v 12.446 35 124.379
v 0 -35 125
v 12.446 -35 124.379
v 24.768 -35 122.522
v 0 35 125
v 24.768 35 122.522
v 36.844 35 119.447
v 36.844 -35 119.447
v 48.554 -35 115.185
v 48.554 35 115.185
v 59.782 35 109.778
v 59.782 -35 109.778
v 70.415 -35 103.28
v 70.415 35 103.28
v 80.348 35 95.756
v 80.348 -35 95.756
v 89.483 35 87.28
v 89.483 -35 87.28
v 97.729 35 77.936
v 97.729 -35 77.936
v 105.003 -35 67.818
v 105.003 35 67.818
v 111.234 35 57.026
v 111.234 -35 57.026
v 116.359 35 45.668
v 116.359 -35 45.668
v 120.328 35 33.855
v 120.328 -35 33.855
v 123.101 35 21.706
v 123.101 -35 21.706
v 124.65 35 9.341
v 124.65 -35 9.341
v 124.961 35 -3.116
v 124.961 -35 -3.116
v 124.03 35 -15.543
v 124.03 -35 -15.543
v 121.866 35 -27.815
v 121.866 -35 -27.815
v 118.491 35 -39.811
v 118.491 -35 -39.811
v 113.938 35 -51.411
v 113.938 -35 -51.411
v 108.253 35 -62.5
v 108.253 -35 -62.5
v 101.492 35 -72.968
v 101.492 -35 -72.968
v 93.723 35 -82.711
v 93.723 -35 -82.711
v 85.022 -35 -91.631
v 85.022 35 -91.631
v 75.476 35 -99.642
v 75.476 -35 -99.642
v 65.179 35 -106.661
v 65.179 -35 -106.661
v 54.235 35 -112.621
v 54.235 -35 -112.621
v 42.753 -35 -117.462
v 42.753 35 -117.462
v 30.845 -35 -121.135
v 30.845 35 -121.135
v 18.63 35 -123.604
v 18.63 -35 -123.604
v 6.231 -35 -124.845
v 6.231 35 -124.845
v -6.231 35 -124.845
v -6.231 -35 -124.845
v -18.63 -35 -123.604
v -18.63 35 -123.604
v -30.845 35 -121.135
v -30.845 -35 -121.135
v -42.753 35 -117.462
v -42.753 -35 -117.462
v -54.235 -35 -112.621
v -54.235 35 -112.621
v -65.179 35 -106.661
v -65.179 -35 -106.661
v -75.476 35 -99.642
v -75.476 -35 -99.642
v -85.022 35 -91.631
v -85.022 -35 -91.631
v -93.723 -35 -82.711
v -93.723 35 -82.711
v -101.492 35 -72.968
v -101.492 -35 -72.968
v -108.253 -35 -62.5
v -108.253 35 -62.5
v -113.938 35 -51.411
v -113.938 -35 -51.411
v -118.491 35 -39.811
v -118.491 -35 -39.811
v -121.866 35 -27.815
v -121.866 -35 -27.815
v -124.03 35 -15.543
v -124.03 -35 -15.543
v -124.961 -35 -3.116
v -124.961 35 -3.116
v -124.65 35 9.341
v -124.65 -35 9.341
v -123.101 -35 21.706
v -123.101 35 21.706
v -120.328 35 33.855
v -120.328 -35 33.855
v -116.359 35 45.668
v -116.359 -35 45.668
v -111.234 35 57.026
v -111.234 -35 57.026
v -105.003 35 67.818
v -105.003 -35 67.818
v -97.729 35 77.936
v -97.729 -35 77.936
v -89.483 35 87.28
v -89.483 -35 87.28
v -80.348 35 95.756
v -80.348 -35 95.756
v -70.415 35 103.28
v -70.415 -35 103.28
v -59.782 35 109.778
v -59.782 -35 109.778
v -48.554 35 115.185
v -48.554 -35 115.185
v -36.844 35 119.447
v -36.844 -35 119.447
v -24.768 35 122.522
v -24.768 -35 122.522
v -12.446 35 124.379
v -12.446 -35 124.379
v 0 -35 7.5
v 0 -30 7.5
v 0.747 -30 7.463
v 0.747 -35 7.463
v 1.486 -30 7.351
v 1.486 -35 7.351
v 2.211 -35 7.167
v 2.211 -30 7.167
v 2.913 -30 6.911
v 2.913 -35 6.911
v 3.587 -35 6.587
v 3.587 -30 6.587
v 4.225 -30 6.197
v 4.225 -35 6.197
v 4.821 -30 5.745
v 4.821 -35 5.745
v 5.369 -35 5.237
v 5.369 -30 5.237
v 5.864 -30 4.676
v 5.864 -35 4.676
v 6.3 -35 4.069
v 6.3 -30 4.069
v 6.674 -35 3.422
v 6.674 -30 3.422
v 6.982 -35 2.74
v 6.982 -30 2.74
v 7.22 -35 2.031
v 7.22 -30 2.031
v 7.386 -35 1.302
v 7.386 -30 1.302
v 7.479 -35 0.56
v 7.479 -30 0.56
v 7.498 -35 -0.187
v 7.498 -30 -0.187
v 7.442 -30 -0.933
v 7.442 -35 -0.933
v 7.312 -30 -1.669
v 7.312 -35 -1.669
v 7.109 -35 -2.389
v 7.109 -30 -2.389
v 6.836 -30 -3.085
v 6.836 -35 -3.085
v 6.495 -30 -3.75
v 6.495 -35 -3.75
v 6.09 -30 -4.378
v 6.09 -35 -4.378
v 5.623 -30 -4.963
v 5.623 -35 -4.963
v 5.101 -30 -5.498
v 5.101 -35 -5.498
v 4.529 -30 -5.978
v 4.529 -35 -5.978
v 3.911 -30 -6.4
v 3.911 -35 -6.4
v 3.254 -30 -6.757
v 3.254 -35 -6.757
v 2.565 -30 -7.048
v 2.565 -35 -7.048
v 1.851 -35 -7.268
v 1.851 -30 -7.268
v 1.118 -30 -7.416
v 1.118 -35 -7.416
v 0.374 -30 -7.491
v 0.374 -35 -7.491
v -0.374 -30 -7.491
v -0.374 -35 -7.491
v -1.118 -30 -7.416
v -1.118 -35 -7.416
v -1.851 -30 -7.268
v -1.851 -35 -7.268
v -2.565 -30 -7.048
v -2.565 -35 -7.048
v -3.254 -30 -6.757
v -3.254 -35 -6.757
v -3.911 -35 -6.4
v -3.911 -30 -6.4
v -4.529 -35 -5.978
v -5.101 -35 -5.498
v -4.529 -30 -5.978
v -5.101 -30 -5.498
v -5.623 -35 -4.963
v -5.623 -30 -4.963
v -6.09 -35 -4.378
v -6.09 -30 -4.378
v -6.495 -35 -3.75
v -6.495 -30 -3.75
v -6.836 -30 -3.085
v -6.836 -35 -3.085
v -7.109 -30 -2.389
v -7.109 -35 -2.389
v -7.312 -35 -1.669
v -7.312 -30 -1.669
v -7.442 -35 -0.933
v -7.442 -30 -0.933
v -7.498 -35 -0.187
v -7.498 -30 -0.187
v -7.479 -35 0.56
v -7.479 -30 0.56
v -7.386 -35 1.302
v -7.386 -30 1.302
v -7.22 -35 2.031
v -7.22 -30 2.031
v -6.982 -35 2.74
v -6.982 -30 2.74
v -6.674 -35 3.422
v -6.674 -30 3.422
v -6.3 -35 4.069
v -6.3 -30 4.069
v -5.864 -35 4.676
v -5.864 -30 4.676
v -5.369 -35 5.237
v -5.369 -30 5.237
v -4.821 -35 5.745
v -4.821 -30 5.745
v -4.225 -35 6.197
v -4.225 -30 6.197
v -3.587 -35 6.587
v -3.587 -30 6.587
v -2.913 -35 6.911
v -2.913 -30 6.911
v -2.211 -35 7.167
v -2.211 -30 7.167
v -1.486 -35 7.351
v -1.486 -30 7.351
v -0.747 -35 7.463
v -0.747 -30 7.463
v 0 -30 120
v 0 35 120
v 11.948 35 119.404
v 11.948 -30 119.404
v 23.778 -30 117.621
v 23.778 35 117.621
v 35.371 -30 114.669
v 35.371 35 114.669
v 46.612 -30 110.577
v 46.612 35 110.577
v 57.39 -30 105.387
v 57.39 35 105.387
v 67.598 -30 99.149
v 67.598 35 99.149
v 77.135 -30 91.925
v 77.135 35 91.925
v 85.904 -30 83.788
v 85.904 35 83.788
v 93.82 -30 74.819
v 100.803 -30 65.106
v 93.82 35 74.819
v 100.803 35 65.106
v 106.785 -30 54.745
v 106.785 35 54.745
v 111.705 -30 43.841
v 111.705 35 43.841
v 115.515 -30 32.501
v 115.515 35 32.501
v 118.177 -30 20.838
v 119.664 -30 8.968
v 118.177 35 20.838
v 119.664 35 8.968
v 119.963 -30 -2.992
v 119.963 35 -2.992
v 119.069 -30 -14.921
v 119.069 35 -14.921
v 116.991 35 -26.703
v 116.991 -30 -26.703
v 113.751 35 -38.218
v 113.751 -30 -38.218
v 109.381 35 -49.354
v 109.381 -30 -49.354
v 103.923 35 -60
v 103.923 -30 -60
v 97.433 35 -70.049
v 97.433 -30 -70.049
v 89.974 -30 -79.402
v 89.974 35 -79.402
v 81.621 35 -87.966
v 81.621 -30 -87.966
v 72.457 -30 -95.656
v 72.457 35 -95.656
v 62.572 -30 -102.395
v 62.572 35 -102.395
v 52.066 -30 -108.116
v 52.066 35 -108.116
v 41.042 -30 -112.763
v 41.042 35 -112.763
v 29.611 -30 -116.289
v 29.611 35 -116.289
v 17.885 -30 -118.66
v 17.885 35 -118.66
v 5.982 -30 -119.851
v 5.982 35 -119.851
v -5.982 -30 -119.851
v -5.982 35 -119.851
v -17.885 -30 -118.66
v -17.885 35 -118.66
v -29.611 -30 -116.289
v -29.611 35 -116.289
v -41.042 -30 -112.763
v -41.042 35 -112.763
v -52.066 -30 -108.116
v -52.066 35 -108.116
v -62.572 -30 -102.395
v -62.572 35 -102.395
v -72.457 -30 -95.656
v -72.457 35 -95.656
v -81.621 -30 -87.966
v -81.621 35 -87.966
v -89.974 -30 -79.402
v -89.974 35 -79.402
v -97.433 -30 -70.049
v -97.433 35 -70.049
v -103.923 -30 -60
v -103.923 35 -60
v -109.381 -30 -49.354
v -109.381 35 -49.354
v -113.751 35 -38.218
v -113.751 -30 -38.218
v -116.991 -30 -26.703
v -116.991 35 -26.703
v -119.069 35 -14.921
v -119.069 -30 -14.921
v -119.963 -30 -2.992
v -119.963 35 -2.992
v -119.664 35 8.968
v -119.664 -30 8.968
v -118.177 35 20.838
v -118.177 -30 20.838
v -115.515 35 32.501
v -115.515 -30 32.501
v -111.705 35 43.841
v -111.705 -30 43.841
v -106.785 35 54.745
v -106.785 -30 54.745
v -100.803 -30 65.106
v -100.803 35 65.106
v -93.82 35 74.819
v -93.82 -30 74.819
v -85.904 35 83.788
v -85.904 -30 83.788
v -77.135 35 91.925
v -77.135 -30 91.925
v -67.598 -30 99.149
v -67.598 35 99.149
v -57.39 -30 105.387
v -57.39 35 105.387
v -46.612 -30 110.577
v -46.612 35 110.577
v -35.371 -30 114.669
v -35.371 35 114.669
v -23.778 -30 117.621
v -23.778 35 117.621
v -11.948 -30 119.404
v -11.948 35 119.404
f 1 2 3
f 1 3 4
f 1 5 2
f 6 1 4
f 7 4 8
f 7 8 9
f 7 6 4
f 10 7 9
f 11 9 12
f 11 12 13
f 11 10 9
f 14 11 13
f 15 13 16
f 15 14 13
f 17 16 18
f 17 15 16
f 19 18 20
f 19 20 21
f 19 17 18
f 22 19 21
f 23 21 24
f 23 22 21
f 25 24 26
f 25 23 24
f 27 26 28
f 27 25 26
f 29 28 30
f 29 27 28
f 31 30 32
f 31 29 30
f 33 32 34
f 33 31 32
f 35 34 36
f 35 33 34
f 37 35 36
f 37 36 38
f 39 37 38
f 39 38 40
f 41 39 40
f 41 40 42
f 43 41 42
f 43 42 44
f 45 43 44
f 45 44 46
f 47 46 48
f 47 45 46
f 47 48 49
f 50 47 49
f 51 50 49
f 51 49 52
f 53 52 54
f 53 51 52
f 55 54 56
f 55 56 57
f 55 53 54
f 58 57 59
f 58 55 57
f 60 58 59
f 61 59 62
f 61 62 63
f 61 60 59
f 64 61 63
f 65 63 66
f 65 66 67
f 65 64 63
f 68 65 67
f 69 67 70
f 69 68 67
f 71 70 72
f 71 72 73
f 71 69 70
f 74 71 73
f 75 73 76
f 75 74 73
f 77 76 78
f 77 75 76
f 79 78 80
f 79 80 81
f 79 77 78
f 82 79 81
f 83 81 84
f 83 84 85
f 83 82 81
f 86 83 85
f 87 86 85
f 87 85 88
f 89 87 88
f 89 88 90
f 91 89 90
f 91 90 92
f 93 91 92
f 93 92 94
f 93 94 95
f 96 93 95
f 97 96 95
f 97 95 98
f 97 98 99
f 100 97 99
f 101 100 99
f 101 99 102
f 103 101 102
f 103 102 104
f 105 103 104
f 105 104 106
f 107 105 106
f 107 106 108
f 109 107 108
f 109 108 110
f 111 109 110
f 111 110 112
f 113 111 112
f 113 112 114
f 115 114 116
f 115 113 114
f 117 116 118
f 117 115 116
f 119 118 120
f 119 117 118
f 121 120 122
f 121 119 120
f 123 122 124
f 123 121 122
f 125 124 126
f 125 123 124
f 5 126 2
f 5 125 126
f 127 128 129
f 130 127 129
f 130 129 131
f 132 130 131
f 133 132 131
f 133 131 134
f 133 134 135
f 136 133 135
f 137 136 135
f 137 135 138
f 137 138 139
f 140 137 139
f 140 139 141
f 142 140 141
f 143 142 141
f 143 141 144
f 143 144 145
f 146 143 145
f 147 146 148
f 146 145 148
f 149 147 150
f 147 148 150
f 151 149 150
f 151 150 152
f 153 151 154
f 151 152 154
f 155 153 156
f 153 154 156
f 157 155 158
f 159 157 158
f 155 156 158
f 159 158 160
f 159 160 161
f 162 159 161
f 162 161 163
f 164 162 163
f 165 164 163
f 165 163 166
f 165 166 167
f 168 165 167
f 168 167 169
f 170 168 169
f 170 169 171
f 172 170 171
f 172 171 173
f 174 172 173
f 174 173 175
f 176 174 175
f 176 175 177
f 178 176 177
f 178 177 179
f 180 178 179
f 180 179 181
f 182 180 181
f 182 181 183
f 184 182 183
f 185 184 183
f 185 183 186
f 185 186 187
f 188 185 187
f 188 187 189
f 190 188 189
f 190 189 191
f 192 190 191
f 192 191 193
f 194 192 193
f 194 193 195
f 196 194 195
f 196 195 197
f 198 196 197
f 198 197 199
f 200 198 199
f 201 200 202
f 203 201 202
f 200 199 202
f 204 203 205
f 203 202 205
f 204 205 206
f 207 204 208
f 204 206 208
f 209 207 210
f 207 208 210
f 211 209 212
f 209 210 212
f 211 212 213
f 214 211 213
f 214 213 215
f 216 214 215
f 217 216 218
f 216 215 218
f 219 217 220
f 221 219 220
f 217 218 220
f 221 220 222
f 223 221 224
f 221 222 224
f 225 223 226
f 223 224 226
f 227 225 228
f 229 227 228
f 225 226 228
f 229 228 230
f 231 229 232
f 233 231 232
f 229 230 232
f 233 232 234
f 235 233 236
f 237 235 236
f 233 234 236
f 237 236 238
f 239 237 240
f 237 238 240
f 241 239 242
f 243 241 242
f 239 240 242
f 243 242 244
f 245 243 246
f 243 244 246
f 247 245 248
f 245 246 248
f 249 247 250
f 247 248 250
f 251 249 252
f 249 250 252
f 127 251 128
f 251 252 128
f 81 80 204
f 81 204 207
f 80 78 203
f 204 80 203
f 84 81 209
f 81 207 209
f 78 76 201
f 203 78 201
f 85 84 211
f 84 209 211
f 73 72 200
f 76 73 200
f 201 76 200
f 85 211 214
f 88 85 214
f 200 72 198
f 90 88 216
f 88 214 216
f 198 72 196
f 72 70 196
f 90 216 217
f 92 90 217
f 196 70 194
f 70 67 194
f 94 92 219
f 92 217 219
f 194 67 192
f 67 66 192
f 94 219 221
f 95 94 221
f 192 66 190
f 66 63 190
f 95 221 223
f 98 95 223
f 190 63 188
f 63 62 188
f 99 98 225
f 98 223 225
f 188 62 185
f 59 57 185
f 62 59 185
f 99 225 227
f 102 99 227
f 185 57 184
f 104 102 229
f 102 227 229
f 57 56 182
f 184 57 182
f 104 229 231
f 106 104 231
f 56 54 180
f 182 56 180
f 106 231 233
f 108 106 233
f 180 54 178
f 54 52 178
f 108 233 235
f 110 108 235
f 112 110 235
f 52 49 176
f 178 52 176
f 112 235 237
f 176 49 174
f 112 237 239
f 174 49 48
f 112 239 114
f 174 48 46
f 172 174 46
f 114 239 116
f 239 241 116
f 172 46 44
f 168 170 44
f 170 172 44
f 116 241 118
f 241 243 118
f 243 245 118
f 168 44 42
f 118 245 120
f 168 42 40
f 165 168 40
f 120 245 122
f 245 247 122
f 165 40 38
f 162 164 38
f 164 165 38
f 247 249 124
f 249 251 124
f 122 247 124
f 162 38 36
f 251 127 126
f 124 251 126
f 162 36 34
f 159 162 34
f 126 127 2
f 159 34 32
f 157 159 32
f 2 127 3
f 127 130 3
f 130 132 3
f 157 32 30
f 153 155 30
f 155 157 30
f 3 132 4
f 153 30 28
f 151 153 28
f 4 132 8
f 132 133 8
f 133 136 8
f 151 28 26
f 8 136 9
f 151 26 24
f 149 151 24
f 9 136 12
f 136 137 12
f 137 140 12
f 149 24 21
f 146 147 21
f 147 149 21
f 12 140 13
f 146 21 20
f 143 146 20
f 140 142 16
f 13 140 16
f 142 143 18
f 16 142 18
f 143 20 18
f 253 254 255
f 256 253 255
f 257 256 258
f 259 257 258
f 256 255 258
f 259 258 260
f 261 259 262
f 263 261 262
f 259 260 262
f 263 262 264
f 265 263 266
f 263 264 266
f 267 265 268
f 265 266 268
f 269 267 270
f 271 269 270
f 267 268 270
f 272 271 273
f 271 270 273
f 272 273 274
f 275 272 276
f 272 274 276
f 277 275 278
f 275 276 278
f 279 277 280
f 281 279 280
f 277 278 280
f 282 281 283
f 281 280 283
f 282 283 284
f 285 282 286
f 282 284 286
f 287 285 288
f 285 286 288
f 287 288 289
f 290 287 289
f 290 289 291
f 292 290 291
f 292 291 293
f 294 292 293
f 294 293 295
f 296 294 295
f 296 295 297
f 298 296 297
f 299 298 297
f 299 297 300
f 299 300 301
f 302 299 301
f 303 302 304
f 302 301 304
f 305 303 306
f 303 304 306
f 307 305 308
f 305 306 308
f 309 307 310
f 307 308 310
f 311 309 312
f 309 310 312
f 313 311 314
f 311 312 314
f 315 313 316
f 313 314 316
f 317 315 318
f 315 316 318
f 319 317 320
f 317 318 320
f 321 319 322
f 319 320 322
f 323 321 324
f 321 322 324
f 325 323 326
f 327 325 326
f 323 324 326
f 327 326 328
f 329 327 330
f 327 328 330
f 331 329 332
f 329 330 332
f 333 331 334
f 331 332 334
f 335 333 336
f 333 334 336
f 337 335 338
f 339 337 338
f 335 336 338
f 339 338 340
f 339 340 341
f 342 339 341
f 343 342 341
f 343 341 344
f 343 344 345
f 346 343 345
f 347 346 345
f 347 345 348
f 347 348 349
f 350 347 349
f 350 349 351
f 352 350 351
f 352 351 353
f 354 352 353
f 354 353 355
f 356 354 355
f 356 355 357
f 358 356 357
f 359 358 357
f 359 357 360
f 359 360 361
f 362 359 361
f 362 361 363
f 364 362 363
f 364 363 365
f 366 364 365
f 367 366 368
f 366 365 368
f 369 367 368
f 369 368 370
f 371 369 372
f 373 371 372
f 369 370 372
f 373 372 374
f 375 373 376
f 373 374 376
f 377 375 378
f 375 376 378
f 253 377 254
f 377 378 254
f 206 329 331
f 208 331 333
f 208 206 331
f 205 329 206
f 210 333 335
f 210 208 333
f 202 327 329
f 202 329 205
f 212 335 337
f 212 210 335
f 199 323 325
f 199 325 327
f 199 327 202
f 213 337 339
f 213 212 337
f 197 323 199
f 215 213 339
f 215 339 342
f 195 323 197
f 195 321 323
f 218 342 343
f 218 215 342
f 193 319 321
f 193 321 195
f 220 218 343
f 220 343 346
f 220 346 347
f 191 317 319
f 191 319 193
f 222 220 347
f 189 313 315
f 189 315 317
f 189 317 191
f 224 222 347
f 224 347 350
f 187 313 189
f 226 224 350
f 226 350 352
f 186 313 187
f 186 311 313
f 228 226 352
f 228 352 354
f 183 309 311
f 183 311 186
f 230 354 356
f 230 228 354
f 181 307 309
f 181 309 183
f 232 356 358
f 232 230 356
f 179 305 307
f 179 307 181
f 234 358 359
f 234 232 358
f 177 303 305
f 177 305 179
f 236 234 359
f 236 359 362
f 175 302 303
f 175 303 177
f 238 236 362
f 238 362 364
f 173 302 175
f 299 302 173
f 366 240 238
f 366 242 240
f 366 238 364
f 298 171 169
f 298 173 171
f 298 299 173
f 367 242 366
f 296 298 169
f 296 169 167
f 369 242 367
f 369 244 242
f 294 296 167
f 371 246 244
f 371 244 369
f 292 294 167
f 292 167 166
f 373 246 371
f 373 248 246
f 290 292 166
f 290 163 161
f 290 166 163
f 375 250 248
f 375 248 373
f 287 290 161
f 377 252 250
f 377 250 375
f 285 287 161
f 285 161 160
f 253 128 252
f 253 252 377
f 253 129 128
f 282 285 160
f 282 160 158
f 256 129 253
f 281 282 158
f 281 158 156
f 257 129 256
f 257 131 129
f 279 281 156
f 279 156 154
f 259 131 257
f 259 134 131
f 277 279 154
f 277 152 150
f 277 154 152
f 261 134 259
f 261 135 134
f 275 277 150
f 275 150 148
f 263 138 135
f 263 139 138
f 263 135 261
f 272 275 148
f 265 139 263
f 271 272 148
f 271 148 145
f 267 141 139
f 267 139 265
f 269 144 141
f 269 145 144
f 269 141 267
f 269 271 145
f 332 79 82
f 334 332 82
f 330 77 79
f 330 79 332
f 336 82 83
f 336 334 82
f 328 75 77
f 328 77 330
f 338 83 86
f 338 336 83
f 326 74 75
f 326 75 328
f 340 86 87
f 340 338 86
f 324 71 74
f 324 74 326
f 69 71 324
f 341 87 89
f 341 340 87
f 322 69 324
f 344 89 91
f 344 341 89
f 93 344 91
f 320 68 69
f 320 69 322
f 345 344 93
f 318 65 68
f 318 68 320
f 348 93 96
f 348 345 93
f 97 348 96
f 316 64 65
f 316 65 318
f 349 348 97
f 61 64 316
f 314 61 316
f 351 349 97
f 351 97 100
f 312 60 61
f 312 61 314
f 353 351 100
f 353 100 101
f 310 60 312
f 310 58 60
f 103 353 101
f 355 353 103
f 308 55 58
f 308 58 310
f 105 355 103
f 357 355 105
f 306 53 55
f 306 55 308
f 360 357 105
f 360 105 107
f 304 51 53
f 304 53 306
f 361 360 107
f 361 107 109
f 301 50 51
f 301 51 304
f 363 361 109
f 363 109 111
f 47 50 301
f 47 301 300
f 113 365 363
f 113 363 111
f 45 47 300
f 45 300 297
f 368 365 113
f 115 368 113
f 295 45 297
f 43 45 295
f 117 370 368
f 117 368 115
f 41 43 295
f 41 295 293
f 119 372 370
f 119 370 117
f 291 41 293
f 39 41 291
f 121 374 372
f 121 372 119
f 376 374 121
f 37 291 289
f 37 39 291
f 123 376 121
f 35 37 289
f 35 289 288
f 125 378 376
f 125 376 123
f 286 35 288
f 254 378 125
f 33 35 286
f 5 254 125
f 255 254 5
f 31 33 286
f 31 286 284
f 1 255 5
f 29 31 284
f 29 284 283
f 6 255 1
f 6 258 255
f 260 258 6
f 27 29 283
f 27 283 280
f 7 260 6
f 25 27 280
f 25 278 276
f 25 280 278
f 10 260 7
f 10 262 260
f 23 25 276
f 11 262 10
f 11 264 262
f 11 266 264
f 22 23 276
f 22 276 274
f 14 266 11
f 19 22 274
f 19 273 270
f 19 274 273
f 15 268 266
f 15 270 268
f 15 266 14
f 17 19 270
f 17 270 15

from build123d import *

# Parameters (mm, degrees)
SKETCH3_R           = 125
BOSS_EXTRUDE1_DEPTH = 35
SKETCH4_R           = 120
CUT_EXTRUDE1_DEPTH  = 65
SKETCH5_R           = 7.5
CUT_EXTRUDE2_DEPTH  = 189.348082018


with BuildPart() as part:
    # Sketch3 → Boss-Extrude1 (new, symmetric)
    with BuildSketch(Plane(origin=(0, 0, 0), x_dir=(1, 0, 0), z_dir=(0, 1, 0))):
        with Locations(Location((0, 0, 0), (0, 0, 270))):
            Circle(SKETCH3_R)
    extrude(amount=BOSS_EXTRUDE1_DEPTH, both=True)

    # Sketch4 → Cut-Extrude1 (cut)
    with BuildSketch(Plane(origin=(0, 35, 0), x_dir=(1, 0, 0), z_dir=(0, 1, 0))):
        with Locations(Location((0, 0, 0), (0, 0, 270))):
            Circle(SKETCH4_R)
    extrude(amount=-CUT_EXTRUDE1_DEPTH, mode=Mode.SUBTRACT)

    # Sketch5 → Cut-Extrude2 (cut, through all)
    with BuildSketch(Plane(origin=(0, -30, 0), x_dir=(1, 0, 0), z_dir=(0, 1, 0))):
        with Locations(Location((0, 0, 0), (0, 0, 270))):
            Circle(SKETCH5_R)
    extrude(amount=-CUT_EXTRUDE2_DEPTH, mode=Mode.SUBTRACT)


solid = part.part
